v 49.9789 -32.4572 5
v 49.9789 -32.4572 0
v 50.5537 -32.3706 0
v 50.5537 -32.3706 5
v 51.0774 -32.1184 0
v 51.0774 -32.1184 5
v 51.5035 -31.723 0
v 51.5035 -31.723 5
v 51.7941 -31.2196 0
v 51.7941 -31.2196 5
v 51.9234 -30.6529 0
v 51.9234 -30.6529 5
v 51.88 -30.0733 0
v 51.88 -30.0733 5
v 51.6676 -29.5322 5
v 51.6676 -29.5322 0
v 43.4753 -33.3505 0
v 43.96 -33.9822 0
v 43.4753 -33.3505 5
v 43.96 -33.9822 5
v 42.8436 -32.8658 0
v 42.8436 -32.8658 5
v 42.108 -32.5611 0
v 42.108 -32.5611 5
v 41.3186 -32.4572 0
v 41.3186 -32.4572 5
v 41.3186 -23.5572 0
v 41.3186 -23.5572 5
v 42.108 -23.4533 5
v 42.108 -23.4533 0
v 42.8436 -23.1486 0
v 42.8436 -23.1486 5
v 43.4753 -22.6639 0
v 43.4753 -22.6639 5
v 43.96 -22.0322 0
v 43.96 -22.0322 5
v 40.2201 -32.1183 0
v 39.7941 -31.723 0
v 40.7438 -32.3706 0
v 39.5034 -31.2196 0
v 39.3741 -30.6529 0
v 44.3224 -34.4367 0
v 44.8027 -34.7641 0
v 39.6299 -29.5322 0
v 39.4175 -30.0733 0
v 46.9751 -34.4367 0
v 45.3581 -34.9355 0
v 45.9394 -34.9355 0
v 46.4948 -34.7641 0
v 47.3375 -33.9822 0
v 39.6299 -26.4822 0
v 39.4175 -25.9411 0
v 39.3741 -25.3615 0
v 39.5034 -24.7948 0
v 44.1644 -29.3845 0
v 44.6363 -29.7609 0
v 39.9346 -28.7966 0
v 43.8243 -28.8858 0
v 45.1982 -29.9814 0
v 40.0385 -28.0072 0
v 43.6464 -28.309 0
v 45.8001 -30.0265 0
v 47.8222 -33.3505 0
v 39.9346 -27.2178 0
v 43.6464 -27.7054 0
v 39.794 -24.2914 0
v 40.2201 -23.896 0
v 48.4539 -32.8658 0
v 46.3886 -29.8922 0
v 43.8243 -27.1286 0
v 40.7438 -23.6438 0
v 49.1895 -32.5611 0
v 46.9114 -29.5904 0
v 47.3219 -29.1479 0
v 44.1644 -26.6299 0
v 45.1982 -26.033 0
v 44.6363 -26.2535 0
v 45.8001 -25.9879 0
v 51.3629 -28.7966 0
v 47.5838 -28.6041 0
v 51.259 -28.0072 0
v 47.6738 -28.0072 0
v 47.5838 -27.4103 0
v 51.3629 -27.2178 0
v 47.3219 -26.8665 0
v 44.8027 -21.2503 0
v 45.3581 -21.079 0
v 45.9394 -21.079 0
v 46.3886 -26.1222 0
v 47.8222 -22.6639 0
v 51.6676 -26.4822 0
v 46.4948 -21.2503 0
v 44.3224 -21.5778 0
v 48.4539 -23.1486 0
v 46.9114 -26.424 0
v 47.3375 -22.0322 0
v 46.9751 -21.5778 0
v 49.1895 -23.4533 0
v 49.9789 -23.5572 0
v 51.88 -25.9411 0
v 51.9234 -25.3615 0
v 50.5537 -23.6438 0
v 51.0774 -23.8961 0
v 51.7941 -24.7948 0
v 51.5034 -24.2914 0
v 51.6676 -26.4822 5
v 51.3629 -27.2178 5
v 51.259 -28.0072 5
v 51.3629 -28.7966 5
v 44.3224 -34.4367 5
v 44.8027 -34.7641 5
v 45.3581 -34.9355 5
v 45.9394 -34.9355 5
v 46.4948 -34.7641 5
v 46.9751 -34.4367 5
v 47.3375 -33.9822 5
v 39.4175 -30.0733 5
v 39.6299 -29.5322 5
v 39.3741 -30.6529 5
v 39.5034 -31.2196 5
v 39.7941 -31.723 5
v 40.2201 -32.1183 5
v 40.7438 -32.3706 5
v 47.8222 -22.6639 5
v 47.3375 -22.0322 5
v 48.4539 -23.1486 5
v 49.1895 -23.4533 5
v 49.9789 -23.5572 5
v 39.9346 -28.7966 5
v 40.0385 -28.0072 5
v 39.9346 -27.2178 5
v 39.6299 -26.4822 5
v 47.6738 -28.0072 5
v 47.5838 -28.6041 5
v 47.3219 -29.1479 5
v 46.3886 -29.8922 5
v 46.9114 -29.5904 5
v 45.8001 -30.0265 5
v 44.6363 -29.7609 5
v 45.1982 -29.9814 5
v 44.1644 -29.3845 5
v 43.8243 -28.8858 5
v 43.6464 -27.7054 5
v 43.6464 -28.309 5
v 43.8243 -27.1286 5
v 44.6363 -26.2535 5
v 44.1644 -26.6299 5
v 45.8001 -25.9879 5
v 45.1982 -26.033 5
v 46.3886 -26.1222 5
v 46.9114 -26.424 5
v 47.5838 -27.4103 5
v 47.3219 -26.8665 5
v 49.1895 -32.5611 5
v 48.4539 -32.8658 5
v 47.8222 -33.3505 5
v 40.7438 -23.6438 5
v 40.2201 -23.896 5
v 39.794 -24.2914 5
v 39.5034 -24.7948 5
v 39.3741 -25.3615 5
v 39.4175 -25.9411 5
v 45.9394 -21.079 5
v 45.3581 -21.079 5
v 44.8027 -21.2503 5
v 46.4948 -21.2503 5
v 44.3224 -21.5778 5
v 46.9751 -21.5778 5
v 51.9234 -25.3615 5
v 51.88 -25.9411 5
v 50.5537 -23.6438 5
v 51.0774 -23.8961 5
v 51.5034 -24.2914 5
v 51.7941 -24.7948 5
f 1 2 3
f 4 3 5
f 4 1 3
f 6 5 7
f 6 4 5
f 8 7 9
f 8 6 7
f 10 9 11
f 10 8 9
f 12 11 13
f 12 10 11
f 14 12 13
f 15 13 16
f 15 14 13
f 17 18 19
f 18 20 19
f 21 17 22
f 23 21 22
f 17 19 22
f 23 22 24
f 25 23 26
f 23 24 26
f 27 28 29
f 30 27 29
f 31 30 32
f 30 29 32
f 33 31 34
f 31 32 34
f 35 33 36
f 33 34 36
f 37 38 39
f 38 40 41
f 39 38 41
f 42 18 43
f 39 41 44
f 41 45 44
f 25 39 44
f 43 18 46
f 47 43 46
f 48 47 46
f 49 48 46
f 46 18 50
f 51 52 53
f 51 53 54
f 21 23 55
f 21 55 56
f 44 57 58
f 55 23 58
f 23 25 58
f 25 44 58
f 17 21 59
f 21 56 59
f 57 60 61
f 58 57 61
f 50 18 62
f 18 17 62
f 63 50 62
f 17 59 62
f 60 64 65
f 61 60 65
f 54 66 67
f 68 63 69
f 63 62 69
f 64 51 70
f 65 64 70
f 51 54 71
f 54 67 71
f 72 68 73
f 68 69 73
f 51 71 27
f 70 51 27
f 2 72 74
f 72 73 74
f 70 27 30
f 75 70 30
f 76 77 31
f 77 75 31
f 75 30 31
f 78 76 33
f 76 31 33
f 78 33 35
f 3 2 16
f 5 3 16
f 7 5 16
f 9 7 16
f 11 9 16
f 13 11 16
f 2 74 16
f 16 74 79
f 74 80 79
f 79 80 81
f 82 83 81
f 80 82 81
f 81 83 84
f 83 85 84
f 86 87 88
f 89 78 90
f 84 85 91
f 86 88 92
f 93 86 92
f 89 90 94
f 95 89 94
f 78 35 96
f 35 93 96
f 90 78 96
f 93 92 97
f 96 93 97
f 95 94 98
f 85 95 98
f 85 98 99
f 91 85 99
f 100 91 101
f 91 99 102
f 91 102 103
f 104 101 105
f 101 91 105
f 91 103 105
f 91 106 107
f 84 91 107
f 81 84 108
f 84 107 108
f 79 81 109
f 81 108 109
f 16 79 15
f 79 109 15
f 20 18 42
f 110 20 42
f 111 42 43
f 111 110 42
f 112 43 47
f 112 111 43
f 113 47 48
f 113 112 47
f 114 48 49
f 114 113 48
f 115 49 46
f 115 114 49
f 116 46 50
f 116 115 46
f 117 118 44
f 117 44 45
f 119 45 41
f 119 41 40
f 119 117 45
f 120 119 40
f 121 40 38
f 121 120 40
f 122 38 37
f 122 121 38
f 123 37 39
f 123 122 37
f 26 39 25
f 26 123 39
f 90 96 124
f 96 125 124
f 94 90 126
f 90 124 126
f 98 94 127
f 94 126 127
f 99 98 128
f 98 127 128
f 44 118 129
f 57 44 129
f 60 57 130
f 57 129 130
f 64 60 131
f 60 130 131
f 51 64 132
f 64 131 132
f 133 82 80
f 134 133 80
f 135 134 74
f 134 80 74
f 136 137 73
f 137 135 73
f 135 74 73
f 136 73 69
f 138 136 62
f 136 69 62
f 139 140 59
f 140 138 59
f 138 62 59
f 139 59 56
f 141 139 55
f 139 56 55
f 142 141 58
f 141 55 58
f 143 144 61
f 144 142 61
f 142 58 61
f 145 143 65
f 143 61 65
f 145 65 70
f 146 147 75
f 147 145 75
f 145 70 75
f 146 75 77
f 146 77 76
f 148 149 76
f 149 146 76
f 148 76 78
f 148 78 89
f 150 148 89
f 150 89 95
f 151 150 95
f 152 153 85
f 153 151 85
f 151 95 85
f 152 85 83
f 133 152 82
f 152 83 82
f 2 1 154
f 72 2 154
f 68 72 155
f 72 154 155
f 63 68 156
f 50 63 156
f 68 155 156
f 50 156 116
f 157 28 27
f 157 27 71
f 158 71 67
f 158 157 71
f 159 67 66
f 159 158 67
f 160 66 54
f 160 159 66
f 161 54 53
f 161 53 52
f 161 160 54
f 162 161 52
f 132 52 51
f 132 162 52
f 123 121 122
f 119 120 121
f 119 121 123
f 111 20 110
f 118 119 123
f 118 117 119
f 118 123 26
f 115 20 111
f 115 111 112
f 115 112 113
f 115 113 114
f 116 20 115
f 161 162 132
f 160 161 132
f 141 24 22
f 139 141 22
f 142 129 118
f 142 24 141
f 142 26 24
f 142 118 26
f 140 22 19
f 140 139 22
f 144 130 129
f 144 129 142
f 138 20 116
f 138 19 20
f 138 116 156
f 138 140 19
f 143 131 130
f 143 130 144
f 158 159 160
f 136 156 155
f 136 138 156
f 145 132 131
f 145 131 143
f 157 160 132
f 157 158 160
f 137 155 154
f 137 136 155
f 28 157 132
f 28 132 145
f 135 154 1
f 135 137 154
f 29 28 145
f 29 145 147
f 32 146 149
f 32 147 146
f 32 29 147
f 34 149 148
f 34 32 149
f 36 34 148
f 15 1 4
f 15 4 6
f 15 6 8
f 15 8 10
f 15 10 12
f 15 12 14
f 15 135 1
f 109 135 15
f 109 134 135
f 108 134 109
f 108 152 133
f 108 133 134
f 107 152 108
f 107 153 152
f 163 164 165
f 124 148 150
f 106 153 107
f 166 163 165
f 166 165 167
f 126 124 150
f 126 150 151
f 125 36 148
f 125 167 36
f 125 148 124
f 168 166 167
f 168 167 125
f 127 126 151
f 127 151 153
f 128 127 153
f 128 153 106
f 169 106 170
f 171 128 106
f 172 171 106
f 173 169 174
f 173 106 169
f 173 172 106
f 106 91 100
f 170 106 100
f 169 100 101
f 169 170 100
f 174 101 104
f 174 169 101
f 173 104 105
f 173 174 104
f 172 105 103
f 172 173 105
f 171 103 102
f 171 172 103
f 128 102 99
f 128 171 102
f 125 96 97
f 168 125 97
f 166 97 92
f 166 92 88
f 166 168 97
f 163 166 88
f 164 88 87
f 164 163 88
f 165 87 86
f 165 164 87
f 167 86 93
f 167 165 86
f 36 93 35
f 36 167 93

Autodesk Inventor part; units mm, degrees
ref_plane "YZ Plane" through (0, 0, 0) normal (1, 0, 0) x (0, 1, 0)
ref_plane "XZ Plane" through (0, 0, 0) normal (0, 1, 0) x (-1, 0, 0)
ref_plane "XY Plane" through (0, 0, 0) normal (0, 0, 1) x (1, 0, 0)
sketch "スケッチ1" plane through (0, 0, 0) normal (0, 0, 1) x (1, 0, 0)
  circle A0 centre (45.6488, -28.0072) radius 8
  circle A1 centre (45.6488, -28.0072) radius 7 construction
  line L0 (45.6488, -21.0072) -> (51.7109, -24.5072) construction
  line L1 (51.7109, -24.5072) -> (51.7109, -31.5072) construction
  line L2 (51.7109, -31.5072) -> (45.6488, -35.0072) construction
  line L3 (45.6488, -35.0072) -> (39.5866, -31.5072) construction
  line L4 (39.5866, -31.5072) -> (39.5866, -24.5072) construction
  line L5 (39.5866, -24.5072) -> (45.6488, -21.0072) construction
  arc A2 (47.3808, -22.0072) -> (43.9167, -22.0072) centre (45.6488, -23.0072) ccw
  arc A3 (41.3186, -23.5072) -> (39.5866, -26.5072) centre (41.3186, -25.5072) ccw
  arc A4 (39.5866, -29.5072) -> (41.3186, -32.5072) centre (41.3186, -30.5072) ccw
  arc A5 (43.9167, -34.0072) -> (47.3808, -34.0072) centre (45.6488, -33.0072) ccw
  arc A6 (49.9789, -32.5072) -> (51.7109, -29.5072) centre (49.9789, -30.5072) ccw
  arc A7 (51.7109, -26.5072) -> (49.9789, -23.5072) centre (49.9789, -25.5072) ccw
  arc A8 (47.3808, -22.0072) -> (49.9789, -23.5072) centre (49.9789, -20.5072) ccw
  arc A9 (41.3186, -23.5072) -> (43.9167, -22.0072) centre (41.3186, -20.5072) ccw
  arc A10 (39.5866, -29.5072) -> (39.5866, -26.5072) centre (36.9885, -28.0072) ccw
  arc A11 (43.9167, -34.0072) -> (41.3186, -32.5072) centre (41.3186, -35.5072) ccw
  arc A12 (49.9789, -32.5072) -> (47.3808, -34.0072) centre (49.9789, -35.5072) ccw
  arc A13 (51.7109, -26.5072) -> (51.7109, -29.5072) centre (54.309, -28.0072) ccw
  circle A14 centre (45.6488, -28.0072) radius 5.6603 construction
  circle A15 centre (45.6488, -28.0072) radius 2.025
  point P0 (0, 0)
  point P1 (51.7109, -31.5072)
  point P2 (51.7109, -24.5072)
  point P3 (51.7109, -26.5072)
  point P4 (43.9167, -22.0072)
  point P5 (41.3186, -23.5072)
  point P6 (39.5866, -26.5072)
  dimension "d5" = 14
  dimension "d4" = 16
  dimension "d6" = 360
  dimension "d7" = 360
  dimension "d8" = 11.3205
  dimension "d9" = 3
  dimension "d10" = 2
  dimension "d13" = 4.05
extrude "押し出し1" add sketch "スケッチ1" along normal blind 5 contours A8 A7 A13 A6 A12 A5 A11 A4 A10 A3 A9 A2
sketch "スケッチ2" plane through (0, 0, 5) normal (0, 0, 1) x (1, 0, 0)
  arc A0 (49.9789, -32.5072) -> (47.3808, -34.0072) centre (49.9789, -35.5072) ccw projected
  arc A1 (49.9789, -32.5072) -> (51.7109, -29.5072) centre (49.9789, -30.5072) ccw projected
  arc A2 (51.7109, -26.5072) -> (51.7109, -29.5072) centre (54.309, -28.0072) ccw projected
  arc A3 (51.7109, -26.5072) -> (49.9789, -23.5072) centre (49.9789, -25.5072) ccw projected
  arc A4 (47.3808, -22.0072) -> (49.9789, -23.5072) centre (49.9789, -20.5072) ccw projected
  arc A5 (47.3808, -22.0072) -> (43.9167, -22.0072) centre (45.6488, -23.0072) ccw projected
  arc A6 (41.3186, -23.5072) -> (43.9167, -22.0072) centre (41.3186, -20.5072) ccw projected
  arc A7 (41.3186, -23.5072) -> (39.5866, -26.5072) centre (41.3186, -25.5072) ccw projected
  arc A8 (39.5866, -29.5072) -> (39.5866, -26.5072) centre (36.9885, -28.0072) ccw projected
  arc A9 (39.5866, -29.5072) -> (41.3186, -32.5072) centre (41.3186, -30.5072) ccw projected
  arc A10 (43.9167, -34.0072) -> (41.3186, -32.5072) centre (41.3186, -35.5072) ccw projected
  arc A11 (43.9167, -34.0072) -> (47.3808, -34.0072) centre (45.6488, -33.0072) ccw projected
  circle A12 centre (45.6488, -28.0072) radius 2.025 projected
  arc A13 (41.3186, -23.5572) -> (39.6299, -26.4822) centre (41.3186, -25.5072) ccw
  arc A14 (41.3186, -23.5572) -> (43.96, -22.0322) centre (41.3186, -20.5072) ccw
  arc A15 (47.3375, -22.0322) -> (43.96, -22.0322) centre (45.6488, -23.0072) ccw
  arc A16 (47.3375, -22.0322) -> (49.9789, -23.5572) centre (49.9789, -20.5072) ccw
  arc A17 (51.6676, -26.4822) -> (49.9789, -23.5572) centre (49.9789, -25.5072) ccw
  arc A18 (51.6676, -26.4822) -> (51.6676, -29.5322) centre (54.309, -28.0072) ccw
  arc A19 (49.9789, -32.4572) -> (51.6676, -29.5322) centre (49.9789, -30.5072) ccw
  arc A20 (49.9789, -32.4572) -> (47.3375, -33.9822) centre (49.9789, -35.5072) ccw
  arc A21 (43.96, -33.9822) -> (47.3375, -33.9822) centre (45.6488, -33.0072) ccw
  arc A22 (43.96, -33.9822) -> (41.3186, -32.4572) centre (41.3186, -35.5072) ccw
  arc A23 (39.6299, -29.5322) -> (41.3186, -32.4572) centre (41.3186, -30.5072) ccw
  arc A24 (39.6299, -29.5322) -> (39.6299, -26.4822) centre (36.9885, -28.0072) ccw
  point P0 (0, 0)
  dimension "d14" = 0.05
extrude "押し出し2" cut sketch "スケッチ2" against normal blind 10 contours A0 A11 A10 A9 A8 A7 A6 A5 A4 A3 A2 A1
properties part number "1ギア接続部" material "アルミニウム 2014-T4"
